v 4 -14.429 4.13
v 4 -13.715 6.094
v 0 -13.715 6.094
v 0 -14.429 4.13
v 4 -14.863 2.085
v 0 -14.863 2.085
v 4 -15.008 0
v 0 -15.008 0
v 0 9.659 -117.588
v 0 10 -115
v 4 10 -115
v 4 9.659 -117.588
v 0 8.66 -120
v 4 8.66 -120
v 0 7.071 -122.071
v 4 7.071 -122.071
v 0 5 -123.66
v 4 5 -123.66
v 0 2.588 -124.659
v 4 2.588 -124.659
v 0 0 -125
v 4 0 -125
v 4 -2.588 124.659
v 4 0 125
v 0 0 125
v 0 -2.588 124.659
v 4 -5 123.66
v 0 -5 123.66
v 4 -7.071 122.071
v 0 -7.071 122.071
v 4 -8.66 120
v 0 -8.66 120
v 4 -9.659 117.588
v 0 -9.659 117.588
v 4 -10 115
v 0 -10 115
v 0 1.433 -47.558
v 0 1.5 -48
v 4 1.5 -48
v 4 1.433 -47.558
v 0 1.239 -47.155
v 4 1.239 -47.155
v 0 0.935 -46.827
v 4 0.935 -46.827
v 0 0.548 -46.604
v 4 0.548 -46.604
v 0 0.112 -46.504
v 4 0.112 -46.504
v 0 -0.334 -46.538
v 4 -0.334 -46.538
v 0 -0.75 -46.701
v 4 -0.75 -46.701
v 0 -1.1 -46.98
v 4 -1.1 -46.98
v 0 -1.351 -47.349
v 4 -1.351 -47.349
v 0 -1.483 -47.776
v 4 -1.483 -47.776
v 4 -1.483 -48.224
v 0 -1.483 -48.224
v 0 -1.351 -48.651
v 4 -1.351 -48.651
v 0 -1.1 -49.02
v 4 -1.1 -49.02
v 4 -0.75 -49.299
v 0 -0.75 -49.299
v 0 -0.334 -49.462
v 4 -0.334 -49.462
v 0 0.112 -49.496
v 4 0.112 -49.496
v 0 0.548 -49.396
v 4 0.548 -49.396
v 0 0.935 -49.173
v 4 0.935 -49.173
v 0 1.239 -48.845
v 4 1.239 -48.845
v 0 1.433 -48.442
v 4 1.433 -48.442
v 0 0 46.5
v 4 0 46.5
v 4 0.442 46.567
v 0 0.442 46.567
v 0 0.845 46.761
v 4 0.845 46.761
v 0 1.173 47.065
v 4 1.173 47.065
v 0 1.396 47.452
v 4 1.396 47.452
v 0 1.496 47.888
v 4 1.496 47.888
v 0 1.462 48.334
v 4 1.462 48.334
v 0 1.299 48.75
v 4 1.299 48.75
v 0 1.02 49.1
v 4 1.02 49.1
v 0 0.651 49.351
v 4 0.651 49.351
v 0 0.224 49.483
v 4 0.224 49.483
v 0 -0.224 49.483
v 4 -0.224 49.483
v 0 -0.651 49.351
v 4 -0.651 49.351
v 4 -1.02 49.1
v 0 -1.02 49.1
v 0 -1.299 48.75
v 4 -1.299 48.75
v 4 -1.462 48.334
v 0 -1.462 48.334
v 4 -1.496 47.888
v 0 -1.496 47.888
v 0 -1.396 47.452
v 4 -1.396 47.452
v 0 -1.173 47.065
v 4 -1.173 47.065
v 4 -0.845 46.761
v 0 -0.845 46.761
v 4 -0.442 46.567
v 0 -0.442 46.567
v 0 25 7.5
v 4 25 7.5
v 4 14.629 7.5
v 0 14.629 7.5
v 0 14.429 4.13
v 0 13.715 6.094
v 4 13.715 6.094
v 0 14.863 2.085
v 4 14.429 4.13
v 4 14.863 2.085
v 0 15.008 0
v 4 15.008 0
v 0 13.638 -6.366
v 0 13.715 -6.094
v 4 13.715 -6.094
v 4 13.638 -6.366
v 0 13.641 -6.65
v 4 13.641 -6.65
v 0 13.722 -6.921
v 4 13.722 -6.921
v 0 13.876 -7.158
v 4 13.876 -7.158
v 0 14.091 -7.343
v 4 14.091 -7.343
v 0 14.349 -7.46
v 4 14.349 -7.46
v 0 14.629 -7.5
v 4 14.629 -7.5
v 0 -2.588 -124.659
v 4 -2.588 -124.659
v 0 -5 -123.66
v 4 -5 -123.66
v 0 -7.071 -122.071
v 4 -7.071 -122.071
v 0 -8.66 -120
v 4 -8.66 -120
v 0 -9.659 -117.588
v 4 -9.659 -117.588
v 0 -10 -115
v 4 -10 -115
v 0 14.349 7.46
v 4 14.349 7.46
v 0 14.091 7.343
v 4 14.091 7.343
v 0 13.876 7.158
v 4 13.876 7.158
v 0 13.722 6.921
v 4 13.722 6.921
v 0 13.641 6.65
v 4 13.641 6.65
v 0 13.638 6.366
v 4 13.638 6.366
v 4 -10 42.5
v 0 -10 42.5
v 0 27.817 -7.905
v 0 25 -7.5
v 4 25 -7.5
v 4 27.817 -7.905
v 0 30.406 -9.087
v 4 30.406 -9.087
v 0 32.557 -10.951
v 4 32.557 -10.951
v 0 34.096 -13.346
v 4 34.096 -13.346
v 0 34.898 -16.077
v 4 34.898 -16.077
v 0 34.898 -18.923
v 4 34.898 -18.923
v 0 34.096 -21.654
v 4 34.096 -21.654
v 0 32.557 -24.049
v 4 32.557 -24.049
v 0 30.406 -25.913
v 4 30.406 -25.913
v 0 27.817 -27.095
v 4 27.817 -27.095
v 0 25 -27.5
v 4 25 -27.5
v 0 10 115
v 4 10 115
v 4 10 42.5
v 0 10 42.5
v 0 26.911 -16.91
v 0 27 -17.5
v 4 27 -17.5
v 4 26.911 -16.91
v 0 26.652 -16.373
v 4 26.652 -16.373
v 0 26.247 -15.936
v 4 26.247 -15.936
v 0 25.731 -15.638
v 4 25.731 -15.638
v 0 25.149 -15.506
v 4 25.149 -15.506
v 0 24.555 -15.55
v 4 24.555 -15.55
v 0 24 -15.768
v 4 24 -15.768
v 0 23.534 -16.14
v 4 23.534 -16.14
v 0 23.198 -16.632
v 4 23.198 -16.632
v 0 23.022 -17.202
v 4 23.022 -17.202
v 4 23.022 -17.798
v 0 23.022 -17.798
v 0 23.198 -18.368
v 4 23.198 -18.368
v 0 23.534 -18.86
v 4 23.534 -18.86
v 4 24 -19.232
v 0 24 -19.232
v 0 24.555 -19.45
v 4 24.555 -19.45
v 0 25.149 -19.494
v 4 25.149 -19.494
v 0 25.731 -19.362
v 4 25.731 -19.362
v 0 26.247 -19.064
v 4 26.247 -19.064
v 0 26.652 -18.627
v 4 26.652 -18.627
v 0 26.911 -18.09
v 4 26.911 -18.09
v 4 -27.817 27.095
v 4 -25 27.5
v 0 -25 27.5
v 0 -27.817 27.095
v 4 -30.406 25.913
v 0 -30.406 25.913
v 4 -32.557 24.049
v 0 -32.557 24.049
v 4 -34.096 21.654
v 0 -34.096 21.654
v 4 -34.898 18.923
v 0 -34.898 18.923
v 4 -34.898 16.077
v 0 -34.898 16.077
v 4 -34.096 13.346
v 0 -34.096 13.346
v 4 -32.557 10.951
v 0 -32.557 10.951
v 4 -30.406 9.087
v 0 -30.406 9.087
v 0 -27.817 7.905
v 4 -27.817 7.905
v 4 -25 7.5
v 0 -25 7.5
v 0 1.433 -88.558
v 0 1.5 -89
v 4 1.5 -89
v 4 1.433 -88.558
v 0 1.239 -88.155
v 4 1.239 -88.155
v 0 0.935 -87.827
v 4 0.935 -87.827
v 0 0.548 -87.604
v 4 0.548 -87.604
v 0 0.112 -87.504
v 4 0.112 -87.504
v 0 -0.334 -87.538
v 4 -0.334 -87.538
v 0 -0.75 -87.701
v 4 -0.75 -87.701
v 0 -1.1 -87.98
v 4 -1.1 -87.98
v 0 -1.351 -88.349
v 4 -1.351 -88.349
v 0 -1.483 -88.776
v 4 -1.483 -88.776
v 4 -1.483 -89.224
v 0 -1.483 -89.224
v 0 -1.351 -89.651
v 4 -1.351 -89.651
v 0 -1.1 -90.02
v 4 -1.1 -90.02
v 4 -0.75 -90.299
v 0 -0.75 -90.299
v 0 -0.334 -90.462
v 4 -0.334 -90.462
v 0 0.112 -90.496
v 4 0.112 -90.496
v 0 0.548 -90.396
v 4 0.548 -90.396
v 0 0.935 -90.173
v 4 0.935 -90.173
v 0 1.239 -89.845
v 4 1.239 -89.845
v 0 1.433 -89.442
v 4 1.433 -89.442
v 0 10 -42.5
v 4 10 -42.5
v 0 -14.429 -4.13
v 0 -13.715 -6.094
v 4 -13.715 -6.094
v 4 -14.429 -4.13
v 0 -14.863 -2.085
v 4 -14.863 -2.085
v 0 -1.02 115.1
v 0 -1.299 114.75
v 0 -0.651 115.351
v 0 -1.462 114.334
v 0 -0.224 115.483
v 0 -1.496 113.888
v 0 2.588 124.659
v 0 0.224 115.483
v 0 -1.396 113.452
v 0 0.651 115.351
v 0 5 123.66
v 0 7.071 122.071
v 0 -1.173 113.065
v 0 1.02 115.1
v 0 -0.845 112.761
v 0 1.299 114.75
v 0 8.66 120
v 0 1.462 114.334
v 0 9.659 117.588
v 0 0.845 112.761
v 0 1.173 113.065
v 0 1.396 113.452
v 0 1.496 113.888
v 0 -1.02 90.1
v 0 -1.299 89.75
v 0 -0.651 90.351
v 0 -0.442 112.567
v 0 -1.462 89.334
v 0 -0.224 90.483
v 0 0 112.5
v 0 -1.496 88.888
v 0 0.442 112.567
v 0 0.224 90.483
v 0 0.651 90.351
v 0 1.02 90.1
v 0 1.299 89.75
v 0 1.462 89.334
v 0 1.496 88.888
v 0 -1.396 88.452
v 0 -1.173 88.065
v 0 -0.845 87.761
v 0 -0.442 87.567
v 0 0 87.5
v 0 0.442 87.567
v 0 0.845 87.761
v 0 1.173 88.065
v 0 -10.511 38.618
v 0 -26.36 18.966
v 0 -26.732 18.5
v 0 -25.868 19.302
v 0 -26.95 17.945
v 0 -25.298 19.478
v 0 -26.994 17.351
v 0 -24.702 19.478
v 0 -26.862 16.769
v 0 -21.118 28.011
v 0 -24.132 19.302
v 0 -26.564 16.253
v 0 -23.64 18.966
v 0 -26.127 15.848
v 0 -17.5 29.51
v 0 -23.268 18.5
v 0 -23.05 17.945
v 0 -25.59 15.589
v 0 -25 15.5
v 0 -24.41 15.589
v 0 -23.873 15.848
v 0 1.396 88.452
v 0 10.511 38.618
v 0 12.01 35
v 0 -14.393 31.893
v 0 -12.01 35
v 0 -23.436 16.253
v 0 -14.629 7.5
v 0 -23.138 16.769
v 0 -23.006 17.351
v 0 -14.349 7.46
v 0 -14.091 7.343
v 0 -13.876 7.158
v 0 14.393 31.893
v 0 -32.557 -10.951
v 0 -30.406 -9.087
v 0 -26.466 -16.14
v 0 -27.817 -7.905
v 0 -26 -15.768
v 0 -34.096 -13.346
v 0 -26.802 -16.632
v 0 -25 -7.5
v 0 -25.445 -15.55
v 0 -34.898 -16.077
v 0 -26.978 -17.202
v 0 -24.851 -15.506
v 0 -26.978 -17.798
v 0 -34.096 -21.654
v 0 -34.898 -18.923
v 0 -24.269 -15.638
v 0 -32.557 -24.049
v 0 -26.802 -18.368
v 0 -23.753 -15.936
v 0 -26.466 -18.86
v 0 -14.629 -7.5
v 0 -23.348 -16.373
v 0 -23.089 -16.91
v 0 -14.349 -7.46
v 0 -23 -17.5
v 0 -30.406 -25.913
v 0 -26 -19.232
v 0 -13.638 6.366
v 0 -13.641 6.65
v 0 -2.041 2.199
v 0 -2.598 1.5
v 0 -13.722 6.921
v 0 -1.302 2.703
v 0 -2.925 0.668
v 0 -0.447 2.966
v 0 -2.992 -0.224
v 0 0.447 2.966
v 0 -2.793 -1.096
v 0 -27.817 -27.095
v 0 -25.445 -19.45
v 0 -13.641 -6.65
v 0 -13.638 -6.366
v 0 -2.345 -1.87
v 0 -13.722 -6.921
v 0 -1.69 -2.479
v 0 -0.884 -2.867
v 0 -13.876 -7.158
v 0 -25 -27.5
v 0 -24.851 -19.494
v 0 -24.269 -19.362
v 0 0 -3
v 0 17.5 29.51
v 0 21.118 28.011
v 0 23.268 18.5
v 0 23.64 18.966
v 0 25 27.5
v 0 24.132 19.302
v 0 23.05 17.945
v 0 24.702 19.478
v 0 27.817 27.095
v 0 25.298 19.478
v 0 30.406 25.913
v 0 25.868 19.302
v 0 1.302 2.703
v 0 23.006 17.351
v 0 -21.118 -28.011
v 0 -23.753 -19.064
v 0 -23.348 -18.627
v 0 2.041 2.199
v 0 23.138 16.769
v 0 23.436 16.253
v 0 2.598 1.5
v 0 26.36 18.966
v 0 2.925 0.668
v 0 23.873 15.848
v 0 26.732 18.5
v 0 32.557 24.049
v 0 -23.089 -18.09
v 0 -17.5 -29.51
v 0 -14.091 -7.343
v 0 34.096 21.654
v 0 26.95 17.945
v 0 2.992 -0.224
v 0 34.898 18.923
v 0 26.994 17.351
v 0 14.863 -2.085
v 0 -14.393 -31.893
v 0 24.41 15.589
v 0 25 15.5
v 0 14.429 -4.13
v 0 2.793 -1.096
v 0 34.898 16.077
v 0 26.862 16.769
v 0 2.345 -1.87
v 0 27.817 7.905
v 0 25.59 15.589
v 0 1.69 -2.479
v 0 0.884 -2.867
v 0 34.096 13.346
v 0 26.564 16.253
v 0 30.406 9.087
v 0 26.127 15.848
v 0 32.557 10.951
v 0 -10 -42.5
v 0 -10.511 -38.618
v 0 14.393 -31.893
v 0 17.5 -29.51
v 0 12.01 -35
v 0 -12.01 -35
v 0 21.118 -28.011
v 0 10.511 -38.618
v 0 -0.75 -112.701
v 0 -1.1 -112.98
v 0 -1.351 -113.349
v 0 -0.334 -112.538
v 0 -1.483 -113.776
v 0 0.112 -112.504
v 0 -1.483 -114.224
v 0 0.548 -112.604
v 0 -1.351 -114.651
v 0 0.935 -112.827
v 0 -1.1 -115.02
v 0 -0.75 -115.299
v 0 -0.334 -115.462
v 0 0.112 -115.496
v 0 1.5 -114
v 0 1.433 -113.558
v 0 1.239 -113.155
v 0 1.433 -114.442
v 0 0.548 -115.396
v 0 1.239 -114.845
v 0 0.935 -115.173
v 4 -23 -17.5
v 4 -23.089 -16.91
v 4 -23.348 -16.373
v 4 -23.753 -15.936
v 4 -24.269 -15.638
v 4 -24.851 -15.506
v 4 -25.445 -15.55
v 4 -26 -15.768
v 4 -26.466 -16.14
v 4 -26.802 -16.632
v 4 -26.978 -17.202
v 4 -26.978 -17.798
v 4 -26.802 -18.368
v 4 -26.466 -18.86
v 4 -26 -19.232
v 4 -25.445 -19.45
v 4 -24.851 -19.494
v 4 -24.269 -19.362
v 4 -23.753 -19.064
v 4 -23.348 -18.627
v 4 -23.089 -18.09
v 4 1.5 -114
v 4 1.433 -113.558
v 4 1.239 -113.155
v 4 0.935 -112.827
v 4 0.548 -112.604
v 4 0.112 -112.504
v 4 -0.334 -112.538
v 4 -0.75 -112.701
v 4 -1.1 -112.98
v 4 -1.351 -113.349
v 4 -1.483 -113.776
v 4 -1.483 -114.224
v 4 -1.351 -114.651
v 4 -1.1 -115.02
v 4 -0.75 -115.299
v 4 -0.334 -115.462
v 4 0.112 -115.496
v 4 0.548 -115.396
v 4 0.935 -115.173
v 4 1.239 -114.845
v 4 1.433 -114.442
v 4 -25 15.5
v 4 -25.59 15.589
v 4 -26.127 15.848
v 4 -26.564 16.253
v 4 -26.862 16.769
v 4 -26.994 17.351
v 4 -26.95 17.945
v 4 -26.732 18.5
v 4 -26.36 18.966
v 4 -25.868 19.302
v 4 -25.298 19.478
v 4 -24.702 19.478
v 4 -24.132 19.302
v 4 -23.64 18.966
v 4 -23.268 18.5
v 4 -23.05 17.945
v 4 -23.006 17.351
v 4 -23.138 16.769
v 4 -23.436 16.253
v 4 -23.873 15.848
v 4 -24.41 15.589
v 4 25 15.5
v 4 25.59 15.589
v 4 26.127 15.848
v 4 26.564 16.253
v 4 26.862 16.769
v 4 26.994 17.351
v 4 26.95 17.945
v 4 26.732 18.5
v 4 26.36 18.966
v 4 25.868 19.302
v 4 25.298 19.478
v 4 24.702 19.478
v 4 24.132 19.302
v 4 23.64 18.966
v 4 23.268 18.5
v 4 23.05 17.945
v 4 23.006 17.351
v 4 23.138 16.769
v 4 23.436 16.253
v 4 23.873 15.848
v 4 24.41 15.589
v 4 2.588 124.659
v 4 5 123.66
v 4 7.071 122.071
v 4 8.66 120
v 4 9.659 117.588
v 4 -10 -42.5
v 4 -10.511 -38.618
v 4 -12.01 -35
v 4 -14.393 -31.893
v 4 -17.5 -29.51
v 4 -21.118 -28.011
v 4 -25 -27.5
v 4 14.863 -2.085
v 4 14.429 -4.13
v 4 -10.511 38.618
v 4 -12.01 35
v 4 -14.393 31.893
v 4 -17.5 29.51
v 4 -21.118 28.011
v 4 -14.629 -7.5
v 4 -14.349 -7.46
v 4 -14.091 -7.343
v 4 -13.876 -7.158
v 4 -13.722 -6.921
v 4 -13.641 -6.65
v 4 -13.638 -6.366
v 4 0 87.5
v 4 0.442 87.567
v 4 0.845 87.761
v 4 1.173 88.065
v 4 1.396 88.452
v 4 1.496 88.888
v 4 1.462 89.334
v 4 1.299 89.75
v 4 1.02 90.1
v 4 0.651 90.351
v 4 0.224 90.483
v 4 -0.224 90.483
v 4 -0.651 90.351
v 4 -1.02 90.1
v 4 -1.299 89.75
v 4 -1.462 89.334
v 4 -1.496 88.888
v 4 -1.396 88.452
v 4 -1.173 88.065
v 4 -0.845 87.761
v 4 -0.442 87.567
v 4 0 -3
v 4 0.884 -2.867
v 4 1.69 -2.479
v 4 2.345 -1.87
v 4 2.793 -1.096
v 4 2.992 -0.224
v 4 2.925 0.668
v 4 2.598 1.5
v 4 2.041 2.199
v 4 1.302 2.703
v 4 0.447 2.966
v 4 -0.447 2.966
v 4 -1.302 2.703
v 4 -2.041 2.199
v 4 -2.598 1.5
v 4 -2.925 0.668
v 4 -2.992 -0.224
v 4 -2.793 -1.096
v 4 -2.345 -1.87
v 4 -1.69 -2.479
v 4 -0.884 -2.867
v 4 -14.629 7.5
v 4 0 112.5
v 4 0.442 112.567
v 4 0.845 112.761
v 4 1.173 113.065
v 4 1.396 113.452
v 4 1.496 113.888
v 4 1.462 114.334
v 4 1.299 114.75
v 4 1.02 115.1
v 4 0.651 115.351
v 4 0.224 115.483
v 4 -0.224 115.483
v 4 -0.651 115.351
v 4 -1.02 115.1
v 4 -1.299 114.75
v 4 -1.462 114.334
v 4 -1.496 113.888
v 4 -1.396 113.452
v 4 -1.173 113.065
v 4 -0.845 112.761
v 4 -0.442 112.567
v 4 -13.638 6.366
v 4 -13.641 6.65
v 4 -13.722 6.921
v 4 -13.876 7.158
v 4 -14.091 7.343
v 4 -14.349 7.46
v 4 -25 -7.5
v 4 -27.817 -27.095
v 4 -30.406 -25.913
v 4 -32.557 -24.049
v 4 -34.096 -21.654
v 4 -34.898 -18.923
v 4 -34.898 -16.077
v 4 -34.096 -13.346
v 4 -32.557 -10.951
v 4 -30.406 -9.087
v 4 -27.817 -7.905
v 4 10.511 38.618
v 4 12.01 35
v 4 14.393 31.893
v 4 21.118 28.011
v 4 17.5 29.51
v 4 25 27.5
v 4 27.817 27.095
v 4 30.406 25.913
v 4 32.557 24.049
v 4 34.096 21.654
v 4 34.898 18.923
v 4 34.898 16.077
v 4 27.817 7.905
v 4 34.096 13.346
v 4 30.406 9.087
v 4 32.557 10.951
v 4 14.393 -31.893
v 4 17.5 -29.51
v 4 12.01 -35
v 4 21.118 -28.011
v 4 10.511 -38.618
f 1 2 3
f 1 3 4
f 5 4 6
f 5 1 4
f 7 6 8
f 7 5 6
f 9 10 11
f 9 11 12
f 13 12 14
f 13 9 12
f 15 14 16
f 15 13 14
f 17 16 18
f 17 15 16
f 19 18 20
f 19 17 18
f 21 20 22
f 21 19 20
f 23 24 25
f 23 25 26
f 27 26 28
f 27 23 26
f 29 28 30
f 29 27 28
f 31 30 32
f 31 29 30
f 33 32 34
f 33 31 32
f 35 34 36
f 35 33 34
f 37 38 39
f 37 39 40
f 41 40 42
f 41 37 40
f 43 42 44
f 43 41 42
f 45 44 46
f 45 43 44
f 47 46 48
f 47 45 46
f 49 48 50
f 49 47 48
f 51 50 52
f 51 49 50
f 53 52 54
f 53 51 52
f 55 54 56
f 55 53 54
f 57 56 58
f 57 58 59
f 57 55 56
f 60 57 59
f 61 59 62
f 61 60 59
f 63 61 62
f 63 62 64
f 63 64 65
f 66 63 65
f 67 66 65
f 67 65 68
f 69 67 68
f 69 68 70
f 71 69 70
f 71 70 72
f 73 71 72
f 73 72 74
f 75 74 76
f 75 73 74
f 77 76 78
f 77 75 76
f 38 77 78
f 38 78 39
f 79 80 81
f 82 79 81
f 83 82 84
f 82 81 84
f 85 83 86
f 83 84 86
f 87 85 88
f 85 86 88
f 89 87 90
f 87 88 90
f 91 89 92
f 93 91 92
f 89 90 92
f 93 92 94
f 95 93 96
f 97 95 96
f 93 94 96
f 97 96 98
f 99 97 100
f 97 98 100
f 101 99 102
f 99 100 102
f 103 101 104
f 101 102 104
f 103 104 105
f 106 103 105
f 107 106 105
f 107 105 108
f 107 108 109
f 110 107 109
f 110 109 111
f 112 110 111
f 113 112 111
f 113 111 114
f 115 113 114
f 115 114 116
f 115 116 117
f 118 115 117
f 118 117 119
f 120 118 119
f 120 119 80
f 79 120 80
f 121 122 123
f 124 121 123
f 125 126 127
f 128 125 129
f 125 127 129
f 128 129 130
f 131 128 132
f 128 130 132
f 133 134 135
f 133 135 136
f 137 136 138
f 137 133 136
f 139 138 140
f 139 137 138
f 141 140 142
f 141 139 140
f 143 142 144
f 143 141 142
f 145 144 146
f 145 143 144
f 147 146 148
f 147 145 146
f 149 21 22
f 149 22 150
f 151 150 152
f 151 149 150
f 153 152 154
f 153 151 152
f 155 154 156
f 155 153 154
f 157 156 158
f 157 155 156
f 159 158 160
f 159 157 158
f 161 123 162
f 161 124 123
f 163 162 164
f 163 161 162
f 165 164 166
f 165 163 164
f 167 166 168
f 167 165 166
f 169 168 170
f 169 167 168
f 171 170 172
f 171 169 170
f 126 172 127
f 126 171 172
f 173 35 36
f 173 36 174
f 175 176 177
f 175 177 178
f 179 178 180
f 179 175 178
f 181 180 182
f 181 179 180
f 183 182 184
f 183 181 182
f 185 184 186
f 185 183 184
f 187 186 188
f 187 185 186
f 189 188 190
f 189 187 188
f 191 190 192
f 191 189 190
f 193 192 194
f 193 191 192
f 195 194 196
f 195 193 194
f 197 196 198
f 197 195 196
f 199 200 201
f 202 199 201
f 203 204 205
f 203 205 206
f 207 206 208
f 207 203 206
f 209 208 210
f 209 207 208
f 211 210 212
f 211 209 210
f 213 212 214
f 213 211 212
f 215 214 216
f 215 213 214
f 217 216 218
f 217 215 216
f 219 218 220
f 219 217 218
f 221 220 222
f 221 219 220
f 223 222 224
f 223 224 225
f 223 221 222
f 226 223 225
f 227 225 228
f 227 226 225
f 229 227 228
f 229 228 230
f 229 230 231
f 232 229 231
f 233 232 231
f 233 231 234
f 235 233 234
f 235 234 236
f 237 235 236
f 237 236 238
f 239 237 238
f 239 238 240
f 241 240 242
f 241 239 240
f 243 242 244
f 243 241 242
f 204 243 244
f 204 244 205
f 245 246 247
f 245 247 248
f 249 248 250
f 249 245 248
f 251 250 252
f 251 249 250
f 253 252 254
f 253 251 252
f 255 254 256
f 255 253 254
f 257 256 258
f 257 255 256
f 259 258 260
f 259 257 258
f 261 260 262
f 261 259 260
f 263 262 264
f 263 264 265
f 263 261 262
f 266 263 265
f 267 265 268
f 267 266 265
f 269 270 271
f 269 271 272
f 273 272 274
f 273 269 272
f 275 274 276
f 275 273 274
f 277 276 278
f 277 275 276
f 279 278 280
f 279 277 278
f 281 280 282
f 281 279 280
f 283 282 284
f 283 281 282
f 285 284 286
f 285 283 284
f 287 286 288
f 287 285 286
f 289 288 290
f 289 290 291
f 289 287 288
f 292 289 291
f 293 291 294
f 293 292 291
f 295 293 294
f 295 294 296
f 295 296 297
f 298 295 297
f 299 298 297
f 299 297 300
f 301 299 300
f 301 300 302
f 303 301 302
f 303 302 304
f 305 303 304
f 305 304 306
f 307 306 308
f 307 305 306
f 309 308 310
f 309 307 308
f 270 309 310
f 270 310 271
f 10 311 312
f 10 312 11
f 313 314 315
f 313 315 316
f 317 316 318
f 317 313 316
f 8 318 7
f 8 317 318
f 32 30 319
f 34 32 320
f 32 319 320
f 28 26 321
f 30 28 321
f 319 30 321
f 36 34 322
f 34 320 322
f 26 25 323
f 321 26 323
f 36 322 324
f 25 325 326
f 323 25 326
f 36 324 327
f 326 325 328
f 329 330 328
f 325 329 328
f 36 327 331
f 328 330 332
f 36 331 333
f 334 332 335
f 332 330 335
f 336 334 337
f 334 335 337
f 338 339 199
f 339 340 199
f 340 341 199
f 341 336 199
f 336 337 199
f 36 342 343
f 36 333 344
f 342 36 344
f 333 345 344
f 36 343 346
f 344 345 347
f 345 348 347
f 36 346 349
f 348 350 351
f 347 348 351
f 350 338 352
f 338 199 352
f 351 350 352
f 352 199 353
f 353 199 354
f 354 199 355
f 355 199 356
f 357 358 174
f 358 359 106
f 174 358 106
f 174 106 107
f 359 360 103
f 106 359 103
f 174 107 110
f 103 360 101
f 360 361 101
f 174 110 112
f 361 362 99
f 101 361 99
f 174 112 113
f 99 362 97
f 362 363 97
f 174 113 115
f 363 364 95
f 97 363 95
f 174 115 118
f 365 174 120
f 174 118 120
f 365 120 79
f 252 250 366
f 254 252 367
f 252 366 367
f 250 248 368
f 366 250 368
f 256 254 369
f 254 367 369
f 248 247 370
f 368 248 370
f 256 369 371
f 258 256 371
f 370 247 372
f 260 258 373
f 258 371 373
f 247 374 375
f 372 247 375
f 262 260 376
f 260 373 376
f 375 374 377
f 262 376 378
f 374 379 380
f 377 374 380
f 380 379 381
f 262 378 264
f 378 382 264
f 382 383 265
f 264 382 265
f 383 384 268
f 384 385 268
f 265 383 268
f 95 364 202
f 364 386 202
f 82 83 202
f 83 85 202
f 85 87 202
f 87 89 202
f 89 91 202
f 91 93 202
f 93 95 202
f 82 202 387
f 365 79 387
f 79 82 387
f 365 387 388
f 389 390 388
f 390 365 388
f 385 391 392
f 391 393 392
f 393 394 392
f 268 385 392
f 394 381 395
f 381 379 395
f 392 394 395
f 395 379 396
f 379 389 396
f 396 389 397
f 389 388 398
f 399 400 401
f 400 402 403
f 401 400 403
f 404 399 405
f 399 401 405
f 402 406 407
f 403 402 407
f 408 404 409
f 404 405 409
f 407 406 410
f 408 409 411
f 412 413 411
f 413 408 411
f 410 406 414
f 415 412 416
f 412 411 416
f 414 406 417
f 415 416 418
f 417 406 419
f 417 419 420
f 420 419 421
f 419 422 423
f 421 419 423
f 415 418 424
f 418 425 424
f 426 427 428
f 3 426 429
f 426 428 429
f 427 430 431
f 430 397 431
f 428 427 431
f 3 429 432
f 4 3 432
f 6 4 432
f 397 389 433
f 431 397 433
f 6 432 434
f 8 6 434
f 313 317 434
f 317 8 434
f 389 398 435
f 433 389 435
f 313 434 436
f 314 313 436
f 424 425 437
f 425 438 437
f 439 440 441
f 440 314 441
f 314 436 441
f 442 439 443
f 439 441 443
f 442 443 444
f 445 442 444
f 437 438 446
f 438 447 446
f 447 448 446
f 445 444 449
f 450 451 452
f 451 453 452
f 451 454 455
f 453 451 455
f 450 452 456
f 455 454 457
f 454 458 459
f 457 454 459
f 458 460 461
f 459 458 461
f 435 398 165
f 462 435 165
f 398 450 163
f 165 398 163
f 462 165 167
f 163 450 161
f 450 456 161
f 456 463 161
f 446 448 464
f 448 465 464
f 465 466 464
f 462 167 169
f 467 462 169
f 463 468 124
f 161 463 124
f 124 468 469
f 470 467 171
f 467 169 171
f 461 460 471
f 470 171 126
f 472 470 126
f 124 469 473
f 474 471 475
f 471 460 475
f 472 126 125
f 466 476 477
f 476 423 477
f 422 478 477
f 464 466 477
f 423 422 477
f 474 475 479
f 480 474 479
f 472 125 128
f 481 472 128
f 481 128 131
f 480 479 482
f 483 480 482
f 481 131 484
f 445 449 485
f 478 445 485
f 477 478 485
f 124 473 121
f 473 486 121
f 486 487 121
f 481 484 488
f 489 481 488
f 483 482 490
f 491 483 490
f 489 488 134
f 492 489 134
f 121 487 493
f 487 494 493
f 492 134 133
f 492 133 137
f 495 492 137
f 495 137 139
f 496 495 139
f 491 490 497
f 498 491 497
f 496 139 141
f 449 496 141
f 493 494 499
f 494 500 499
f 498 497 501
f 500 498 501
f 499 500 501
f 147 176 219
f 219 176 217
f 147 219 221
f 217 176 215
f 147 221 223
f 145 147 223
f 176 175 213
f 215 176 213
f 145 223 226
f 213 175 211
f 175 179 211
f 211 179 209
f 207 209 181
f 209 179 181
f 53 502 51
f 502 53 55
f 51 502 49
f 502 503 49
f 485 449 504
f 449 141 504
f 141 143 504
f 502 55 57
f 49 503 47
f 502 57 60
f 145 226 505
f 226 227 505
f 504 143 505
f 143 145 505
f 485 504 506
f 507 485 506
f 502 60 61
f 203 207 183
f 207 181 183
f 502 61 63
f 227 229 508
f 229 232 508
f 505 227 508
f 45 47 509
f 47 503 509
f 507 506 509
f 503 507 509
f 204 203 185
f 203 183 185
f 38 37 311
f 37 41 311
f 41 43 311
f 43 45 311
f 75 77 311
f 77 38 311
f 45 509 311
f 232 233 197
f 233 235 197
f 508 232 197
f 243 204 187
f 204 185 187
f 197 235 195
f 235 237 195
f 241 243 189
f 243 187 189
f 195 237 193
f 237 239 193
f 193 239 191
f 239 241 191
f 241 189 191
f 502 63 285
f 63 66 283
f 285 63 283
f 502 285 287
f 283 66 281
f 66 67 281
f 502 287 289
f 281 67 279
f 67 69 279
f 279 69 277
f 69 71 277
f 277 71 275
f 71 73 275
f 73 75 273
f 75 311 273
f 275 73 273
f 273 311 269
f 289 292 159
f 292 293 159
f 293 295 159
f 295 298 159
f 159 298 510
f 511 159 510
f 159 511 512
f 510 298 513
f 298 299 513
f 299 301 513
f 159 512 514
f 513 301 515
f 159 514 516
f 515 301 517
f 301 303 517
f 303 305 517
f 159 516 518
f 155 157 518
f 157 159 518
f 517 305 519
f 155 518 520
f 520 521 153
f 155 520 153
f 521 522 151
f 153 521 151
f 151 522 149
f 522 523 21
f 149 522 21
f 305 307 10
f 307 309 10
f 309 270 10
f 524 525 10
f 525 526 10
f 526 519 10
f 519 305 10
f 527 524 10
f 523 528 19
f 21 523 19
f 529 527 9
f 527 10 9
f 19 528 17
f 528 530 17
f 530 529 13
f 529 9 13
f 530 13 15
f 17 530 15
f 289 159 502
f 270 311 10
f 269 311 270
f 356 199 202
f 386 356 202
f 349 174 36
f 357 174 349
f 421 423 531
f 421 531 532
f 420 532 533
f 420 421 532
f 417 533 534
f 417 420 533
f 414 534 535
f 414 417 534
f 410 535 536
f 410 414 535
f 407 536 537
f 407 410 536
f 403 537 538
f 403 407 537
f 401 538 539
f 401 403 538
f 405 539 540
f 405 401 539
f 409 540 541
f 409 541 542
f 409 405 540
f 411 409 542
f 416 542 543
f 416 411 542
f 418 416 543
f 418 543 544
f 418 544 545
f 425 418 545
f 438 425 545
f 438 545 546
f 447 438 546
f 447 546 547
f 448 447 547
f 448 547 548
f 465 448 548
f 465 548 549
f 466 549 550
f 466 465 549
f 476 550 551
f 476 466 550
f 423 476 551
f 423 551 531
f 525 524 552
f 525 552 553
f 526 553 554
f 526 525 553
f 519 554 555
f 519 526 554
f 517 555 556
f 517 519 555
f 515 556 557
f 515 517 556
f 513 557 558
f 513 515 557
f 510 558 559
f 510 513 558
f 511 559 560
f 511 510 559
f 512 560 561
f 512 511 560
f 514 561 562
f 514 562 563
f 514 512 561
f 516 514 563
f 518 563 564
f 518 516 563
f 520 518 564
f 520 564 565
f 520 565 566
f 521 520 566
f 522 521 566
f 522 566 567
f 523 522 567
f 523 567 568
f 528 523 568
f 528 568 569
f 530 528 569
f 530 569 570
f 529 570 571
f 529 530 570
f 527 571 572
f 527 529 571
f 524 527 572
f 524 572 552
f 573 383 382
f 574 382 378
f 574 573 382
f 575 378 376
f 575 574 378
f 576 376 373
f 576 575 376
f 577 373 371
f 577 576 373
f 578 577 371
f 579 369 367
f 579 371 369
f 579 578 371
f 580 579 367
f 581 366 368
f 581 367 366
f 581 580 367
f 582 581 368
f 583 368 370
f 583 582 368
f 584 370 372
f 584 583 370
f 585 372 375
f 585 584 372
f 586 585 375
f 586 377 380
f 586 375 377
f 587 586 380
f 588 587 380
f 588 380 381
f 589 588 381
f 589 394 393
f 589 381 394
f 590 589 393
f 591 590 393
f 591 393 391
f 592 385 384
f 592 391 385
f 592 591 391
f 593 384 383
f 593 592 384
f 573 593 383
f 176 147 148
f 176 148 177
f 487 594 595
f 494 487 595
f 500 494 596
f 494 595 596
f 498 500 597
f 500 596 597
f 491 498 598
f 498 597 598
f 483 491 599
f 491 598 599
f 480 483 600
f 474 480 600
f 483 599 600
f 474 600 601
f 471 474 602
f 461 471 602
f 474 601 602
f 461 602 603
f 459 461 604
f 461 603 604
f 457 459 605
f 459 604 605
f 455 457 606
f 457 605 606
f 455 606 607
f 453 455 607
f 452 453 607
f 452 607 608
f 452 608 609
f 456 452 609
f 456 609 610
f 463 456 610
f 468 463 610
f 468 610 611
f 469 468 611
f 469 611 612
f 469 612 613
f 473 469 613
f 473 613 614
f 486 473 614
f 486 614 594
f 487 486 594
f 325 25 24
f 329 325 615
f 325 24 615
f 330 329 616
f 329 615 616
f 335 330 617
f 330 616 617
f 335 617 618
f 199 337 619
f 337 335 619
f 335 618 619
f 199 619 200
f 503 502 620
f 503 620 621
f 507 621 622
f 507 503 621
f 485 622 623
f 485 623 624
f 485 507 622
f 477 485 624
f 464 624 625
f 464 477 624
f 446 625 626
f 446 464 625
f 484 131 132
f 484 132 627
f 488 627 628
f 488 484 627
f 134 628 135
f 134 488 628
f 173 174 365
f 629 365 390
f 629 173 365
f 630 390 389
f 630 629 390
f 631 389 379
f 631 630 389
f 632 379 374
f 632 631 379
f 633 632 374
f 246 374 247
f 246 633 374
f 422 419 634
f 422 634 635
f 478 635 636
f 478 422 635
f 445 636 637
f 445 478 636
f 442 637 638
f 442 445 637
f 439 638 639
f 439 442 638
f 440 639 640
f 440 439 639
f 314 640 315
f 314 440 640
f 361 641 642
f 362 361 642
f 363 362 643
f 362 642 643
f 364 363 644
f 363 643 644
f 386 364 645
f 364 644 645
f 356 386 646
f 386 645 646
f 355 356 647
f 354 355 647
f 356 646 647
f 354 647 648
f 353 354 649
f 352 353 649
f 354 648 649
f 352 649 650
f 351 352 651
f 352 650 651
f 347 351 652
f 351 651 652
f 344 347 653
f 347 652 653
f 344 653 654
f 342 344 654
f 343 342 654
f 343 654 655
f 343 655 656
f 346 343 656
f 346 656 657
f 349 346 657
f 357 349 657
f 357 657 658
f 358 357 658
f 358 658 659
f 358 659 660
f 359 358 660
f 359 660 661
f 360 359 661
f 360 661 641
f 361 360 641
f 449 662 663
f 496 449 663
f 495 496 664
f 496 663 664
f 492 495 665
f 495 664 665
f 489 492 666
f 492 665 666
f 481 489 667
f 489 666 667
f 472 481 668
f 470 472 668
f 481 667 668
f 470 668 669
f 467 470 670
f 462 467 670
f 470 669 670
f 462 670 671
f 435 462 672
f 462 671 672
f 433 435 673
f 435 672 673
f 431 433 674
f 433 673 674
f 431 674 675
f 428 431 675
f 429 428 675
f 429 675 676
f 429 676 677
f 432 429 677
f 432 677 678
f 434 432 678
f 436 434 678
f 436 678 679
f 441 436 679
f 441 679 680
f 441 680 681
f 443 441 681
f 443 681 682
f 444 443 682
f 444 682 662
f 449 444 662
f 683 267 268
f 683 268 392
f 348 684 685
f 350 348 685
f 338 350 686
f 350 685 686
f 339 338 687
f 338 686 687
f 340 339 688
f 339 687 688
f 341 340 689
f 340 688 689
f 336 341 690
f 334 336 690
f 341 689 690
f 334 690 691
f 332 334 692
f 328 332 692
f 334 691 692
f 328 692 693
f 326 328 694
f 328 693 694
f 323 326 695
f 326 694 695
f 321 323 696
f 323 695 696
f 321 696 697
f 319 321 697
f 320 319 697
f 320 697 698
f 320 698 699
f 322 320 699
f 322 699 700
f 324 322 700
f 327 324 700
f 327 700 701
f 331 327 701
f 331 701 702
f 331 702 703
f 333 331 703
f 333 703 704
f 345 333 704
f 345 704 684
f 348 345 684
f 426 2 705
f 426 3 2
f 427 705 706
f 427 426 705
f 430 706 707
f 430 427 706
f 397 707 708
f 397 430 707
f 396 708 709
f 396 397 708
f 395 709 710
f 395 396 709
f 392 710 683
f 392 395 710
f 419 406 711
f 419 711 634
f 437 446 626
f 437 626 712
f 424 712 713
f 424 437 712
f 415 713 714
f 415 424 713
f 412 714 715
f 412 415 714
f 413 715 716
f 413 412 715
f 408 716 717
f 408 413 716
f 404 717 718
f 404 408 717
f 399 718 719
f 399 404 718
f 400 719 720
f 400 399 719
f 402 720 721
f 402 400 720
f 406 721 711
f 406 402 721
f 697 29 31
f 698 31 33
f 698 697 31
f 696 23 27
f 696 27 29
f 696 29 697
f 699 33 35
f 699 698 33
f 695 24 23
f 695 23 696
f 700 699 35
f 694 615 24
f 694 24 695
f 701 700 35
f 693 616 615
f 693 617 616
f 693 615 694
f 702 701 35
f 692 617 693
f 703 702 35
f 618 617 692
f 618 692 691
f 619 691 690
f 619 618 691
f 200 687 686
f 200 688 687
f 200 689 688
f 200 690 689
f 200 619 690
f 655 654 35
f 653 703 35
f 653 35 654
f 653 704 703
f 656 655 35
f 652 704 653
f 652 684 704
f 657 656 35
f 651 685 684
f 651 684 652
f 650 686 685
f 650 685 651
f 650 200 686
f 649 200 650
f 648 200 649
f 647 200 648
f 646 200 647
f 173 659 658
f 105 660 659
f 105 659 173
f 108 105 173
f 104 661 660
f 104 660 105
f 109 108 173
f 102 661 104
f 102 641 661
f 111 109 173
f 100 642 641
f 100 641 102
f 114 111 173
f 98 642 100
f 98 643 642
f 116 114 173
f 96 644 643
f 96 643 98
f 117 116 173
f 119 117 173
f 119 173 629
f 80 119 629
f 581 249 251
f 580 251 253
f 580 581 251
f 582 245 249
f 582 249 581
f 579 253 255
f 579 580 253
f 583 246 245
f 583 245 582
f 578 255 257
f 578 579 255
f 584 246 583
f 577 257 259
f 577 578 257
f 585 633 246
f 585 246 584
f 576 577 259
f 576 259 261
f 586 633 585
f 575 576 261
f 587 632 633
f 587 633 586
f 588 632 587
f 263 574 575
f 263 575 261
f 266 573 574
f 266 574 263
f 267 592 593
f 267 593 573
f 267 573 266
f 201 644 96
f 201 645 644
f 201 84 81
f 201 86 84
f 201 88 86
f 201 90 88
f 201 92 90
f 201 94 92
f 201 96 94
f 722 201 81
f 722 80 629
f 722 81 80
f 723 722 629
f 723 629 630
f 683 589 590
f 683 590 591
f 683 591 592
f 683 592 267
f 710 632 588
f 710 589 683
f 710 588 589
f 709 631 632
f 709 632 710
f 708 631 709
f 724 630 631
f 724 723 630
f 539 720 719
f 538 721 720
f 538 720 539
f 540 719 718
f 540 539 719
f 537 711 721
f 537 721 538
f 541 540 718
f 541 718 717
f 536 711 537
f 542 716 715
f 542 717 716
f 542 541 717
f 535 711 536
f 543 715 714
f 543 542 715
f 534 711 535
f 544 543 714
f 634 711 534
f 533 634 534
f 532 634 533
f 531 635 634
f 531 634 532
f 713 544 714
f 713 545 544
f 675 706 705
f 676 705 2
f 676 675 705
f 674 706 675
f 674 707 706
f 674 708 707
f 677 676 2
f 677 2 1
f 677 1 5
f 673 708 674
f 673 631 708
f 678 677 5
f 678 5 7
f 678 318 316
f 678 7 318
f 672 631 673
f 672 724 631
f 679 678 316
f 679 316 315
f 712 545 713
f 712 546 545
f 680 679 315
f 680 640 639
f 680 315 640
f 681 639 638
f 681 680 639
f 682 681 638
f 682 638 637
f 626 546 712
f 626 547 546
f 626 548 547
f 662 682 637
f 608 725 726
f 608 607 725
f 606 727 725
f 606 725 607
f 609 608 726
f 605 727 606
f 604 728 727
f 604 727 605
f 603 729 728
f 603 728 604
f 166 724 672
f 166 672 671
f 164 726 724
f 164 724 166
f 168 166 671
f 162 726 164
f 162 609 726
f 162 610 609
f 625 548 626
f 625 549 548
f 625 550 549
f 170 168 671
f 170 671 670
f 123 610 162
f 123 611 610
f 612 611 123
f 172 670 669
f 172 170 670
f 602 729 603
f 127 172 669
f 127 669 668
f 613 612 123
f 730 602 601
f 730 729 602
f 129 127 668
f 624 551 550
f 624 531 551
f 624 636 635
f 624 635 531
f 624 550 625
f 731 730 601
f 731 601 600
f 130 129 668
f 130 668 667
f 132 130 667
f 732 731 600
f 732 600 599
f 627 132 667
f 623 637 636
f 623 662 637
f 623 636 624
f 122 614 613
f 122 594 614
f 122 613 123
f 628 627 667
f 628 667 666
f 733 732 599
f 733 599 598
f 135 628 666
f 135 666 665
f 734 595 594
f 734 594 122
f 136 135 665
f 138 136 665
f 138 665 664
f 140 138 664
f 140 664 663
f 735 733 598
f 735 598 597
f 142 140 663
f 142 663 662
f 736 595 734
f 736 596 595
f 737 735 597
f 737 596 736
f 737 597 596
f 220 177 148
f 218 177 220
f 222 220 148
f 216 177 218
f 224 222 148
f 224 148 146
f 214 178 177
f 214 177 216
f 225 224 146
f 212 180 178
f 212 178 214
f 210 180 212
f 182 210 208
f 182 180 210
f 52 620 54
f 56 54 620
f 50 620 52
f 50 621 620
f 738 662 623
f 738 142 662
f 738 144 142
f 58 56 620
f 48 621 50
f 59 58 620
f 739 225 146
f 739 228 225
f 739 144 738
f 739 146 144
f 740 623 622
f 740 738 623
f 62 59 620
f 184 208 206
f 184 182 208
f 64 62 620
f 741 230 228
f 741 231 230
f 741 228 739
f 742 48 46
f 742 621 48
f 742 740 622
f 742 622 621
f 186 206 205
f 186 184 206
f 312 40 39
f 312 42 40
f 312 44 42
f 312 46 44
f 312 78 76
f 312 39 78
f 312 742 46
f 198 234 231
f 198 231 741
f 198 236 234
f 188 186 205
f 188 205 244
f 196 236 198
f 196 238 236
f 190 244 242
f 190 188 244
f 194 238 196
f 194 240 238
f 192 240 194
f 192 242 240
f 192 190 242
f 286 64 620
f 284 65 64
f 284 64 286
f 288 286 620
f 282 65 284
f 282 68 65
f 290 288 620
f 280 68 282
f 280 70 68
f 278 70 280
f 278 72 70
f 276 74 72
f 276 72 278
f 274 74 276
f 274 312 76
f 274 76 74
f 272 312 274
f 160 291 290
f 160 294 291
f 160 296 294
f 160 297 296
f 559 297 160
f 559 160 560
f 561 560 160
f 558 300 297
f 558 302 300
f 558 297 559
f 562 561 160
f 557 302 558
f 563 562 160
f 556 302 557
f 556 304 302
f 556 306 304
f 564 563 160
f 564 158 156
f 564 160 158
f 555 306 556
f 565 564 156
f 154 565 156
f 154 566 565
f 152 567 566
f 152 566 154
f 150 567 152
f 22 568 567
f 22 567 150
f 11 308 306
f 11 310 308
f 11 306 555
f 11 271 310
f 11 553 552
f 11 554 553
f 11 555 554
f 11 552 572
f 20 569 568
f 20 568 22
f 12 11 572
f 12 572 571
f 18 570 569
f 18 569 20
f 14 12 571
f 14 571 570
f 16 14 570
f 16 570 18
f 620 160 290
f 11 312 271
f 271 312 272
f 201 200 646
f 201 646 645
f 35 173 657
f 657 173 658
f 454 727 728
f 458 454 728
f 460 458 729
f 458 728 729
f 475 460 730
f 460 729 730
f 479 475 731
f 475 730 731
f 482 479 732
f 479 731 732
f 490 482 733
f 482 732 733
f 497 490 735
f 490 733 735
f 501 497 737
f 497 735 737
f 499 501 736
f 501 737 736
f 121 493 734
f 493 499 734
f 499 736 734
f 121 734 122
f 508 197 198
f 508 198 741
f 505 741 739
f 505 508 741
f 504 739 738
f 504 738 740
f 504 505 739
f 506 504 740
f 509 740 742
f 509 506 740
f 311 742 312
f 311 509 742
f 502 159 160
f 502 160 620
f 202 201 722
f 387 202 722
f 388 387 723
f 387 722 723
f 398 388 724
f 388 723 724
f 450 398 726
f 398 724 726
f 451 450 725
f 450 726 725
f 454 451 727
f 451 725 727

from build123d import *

# Parameters (mm, degrees)
SKETCH1_W            = 250
SKETCH1_H            = 75
BOSS_EXTRUDE1_DEPTH  = 4
SKETCH2_R            = 3
SKETCH2_R_2          = 1.5
CUT_EXTRUDE1_DEPTH   = 131.565117853
SKETCH3_R            = 2
CUT_EXTRUDE2_DEPTH   = 131.565117853
CUT_EXTRUDE3_DEPTH   = 131.565117853
FILLET1_R            = 1
FILLET1_OF_MIRROR2_R = 1
MIRROR3_OUTLINE_R    = 1.5
MIRROR3_OUTLINE_R_2  = 2
MIRROR3_DEPTH        = 4


# Read off the part's stored shape, not the designer's step: Mirror3
with BuildPart() as part:
    # Sketch1 → Boss-Extrude1 (new body)
    with BuildSketch(Plane(origin=(0, 0, 0), x_dir=(0, 0, -1), z_dir=(1, 0, 0))):
        Rectangle(SKETCH1_W, SKETCH1_H)
    extrude(amount=BOSS_EXTRUDE1_DEPTH)

    # Sketch2 → Cut-Extrude1 (cut, through all)
    with BuildSketch(Plane(origin=(4, 0, 0), x_dir=(0, 0, -1), z_dir=(1, 0, 0))):
        Circle(SKETCH2_R)
        with Locations((-48, 0)):
            Circle(SKETCH2_R_2)
        with Locations((-89, 0)):
            Circle(SKETCH2_R_2)
        with Locations((-114, 0)):
            Circle(SKETCH2_R_2)
    extrude(amount=-CUT_EXTRUDE1_DEPTH, mode=Mode.SUBTRACT)

    # Sketch3 → Cut-Extrude2 (cut, through all)
    with BuildSketch(Plane(origin=(4, 0, 0), x_dir=(0, 0, -1), z_dir=(1, 0, 0))):
        with Locations((-17.5, 25)):
            Circle(SKETCH3_R)
    cut_extrude2 = extrude(amount=-CUT_EXTRUDE2_DEPTH, mode=Mode.SUBTRACT)

    # Sketch4 → Cut-Extrude3 (cut, through all)
    with BuildSketch(Plane(origin=(4, 0, 0), x_dir=(0, 0, -1), z_dir=(1, 0, 0))):
        with BuildLine():
            Line((-115, 10), (-42.5, 10))
            ThreePointArc((-42.5, 10), (-31.893398282, 14.393398282), (-27.5, 25))
            ThreePointArc((-27.5, 25), (-17.5, 35), (-7.5, 25))
            Line((-7.5, 25), (-7.5, 13))
            ThreePointArc((-7.5, 13), (-3.882119057, 14.497556747), (0, 15.00833102))
            Line((0, 15.00833102), (0, 37.5))
            Line((0, 37.5), (-125, 37.5))
            Line((-125, 37.5), (-125, 0))
            ThreePointArc((-125, 0), (-122.071067812, 7.071067812), (-115, 10))
        make_face()
    cut_extrude3 = extrude(amount=-CUT_EXTRUDE3_DEPTH, mode=Mode.SUBTRACT)

    # Fillet1
    fillet1_edges = [part.edges().sort_by_distance(p)[0] for p in [
        (2, 13, 7.5),
    ]]
    fillet(fillet1_edges, radius=FILLET1_R)

    # Mirror2: Cut-Extrude2, Cut-Extrude3 across plane
    add(cut_extrude2.mirror(Plane.ZX), mode=Mode.SUBTRACT)
    add(cut_extrude3.mirror(Plane.ZX), mode=Mode.SUBTRACT)

    # Fillet1 of Mirror2
    fillet1_of_mirror2_edges = [part.edges().sort_by_distance(p)[0] for p in [
        (2, -13, 7.5),
    ]]
    fillet(fillet1_of_mirror2_edges, radius=FILLET1_OF_MIRROR2_R)

    # Mirror3 outline → Mirror3 (cut)
    with BuildSketch(Plane.YZ):
        with BuildLine():
            Line((-37.5, -125), (-3.5e-08, -125))
            ThreePointArc((-3.5e-08, -125), (-7.071067824, -122.071067799), (-10, -115))
            Line((-10, -115), (-10, -42.5))
            ThreePointArc((-10, -42.5), (-14.393398282, -31.893398282), (-25, -27.5))
            ThreePointArc((-25, -27.5), (-35, -17.5), (-25, -7.5))
            Line((-25, -7.5), (-14.629308324, -7.5))
            ThreePointArc((-14.629308324, -7.5), (-13.790845868, -7.044959365), (-13.715452388, -6.09396142))
            ThreePointArc((-13.715452388, -6.09396142), (-14.681553895, -3.114799389), (-15.00833102, 0))
            Line((-15.00833102, 0), (-37.5, 0))
            Line((-37.5, 0), (-37.5, -125))
        make_face()
        with BuildLine():
            ThreePointArc((15.00833102, 0), (14.681553895, -3.114799389), (13.715452388, -6.09396142))
            ThreePointArc((13.715452388, -6.09396142), (13.790845868, -7.044959365), (14.629308324, -7.5))
            Line((14.629308324, -7.5), (25, -7.5))
            ThreePointArc((25, -7.5), (35, -17.5), (25, -27.5))
            ThreePointArc((25, -27.5), (14.393398282, -31.893398282), (10, -42.5))
            Line((10, -42.5), (10, -115))
            ThreePointArc((10, -115), (7.071067799, -122.071067824), (-3.5e-08, -125))
            Line((-3.5e-08, -125), (37.5, -125))
            Line((37.5, -125), (37.5, 0))
            Line((37.5, 0), (15.00833102, 0))
        make_face()
        with Locations((0, -114)):
            Circle(MIRROR3_OUTLINE_R)
        with Locations((0, -89)):
            Circle(MIRROR3_OUTLINE_R)
        with Locations((0, -48)):
            Circle(MIRROR3_OUTLINE_R)
        with Locations((25, -17.5)):
            Circle(MIRROR3_OUTLINE_R_2)
        with Locations((-25, -17.5)):
            Circle(MIRROR3_OUTLINE_R_2)
    extrude(amount=MIRROR3_DEPTH, mode=Mode.SUBTRACT)


solid = part.part
